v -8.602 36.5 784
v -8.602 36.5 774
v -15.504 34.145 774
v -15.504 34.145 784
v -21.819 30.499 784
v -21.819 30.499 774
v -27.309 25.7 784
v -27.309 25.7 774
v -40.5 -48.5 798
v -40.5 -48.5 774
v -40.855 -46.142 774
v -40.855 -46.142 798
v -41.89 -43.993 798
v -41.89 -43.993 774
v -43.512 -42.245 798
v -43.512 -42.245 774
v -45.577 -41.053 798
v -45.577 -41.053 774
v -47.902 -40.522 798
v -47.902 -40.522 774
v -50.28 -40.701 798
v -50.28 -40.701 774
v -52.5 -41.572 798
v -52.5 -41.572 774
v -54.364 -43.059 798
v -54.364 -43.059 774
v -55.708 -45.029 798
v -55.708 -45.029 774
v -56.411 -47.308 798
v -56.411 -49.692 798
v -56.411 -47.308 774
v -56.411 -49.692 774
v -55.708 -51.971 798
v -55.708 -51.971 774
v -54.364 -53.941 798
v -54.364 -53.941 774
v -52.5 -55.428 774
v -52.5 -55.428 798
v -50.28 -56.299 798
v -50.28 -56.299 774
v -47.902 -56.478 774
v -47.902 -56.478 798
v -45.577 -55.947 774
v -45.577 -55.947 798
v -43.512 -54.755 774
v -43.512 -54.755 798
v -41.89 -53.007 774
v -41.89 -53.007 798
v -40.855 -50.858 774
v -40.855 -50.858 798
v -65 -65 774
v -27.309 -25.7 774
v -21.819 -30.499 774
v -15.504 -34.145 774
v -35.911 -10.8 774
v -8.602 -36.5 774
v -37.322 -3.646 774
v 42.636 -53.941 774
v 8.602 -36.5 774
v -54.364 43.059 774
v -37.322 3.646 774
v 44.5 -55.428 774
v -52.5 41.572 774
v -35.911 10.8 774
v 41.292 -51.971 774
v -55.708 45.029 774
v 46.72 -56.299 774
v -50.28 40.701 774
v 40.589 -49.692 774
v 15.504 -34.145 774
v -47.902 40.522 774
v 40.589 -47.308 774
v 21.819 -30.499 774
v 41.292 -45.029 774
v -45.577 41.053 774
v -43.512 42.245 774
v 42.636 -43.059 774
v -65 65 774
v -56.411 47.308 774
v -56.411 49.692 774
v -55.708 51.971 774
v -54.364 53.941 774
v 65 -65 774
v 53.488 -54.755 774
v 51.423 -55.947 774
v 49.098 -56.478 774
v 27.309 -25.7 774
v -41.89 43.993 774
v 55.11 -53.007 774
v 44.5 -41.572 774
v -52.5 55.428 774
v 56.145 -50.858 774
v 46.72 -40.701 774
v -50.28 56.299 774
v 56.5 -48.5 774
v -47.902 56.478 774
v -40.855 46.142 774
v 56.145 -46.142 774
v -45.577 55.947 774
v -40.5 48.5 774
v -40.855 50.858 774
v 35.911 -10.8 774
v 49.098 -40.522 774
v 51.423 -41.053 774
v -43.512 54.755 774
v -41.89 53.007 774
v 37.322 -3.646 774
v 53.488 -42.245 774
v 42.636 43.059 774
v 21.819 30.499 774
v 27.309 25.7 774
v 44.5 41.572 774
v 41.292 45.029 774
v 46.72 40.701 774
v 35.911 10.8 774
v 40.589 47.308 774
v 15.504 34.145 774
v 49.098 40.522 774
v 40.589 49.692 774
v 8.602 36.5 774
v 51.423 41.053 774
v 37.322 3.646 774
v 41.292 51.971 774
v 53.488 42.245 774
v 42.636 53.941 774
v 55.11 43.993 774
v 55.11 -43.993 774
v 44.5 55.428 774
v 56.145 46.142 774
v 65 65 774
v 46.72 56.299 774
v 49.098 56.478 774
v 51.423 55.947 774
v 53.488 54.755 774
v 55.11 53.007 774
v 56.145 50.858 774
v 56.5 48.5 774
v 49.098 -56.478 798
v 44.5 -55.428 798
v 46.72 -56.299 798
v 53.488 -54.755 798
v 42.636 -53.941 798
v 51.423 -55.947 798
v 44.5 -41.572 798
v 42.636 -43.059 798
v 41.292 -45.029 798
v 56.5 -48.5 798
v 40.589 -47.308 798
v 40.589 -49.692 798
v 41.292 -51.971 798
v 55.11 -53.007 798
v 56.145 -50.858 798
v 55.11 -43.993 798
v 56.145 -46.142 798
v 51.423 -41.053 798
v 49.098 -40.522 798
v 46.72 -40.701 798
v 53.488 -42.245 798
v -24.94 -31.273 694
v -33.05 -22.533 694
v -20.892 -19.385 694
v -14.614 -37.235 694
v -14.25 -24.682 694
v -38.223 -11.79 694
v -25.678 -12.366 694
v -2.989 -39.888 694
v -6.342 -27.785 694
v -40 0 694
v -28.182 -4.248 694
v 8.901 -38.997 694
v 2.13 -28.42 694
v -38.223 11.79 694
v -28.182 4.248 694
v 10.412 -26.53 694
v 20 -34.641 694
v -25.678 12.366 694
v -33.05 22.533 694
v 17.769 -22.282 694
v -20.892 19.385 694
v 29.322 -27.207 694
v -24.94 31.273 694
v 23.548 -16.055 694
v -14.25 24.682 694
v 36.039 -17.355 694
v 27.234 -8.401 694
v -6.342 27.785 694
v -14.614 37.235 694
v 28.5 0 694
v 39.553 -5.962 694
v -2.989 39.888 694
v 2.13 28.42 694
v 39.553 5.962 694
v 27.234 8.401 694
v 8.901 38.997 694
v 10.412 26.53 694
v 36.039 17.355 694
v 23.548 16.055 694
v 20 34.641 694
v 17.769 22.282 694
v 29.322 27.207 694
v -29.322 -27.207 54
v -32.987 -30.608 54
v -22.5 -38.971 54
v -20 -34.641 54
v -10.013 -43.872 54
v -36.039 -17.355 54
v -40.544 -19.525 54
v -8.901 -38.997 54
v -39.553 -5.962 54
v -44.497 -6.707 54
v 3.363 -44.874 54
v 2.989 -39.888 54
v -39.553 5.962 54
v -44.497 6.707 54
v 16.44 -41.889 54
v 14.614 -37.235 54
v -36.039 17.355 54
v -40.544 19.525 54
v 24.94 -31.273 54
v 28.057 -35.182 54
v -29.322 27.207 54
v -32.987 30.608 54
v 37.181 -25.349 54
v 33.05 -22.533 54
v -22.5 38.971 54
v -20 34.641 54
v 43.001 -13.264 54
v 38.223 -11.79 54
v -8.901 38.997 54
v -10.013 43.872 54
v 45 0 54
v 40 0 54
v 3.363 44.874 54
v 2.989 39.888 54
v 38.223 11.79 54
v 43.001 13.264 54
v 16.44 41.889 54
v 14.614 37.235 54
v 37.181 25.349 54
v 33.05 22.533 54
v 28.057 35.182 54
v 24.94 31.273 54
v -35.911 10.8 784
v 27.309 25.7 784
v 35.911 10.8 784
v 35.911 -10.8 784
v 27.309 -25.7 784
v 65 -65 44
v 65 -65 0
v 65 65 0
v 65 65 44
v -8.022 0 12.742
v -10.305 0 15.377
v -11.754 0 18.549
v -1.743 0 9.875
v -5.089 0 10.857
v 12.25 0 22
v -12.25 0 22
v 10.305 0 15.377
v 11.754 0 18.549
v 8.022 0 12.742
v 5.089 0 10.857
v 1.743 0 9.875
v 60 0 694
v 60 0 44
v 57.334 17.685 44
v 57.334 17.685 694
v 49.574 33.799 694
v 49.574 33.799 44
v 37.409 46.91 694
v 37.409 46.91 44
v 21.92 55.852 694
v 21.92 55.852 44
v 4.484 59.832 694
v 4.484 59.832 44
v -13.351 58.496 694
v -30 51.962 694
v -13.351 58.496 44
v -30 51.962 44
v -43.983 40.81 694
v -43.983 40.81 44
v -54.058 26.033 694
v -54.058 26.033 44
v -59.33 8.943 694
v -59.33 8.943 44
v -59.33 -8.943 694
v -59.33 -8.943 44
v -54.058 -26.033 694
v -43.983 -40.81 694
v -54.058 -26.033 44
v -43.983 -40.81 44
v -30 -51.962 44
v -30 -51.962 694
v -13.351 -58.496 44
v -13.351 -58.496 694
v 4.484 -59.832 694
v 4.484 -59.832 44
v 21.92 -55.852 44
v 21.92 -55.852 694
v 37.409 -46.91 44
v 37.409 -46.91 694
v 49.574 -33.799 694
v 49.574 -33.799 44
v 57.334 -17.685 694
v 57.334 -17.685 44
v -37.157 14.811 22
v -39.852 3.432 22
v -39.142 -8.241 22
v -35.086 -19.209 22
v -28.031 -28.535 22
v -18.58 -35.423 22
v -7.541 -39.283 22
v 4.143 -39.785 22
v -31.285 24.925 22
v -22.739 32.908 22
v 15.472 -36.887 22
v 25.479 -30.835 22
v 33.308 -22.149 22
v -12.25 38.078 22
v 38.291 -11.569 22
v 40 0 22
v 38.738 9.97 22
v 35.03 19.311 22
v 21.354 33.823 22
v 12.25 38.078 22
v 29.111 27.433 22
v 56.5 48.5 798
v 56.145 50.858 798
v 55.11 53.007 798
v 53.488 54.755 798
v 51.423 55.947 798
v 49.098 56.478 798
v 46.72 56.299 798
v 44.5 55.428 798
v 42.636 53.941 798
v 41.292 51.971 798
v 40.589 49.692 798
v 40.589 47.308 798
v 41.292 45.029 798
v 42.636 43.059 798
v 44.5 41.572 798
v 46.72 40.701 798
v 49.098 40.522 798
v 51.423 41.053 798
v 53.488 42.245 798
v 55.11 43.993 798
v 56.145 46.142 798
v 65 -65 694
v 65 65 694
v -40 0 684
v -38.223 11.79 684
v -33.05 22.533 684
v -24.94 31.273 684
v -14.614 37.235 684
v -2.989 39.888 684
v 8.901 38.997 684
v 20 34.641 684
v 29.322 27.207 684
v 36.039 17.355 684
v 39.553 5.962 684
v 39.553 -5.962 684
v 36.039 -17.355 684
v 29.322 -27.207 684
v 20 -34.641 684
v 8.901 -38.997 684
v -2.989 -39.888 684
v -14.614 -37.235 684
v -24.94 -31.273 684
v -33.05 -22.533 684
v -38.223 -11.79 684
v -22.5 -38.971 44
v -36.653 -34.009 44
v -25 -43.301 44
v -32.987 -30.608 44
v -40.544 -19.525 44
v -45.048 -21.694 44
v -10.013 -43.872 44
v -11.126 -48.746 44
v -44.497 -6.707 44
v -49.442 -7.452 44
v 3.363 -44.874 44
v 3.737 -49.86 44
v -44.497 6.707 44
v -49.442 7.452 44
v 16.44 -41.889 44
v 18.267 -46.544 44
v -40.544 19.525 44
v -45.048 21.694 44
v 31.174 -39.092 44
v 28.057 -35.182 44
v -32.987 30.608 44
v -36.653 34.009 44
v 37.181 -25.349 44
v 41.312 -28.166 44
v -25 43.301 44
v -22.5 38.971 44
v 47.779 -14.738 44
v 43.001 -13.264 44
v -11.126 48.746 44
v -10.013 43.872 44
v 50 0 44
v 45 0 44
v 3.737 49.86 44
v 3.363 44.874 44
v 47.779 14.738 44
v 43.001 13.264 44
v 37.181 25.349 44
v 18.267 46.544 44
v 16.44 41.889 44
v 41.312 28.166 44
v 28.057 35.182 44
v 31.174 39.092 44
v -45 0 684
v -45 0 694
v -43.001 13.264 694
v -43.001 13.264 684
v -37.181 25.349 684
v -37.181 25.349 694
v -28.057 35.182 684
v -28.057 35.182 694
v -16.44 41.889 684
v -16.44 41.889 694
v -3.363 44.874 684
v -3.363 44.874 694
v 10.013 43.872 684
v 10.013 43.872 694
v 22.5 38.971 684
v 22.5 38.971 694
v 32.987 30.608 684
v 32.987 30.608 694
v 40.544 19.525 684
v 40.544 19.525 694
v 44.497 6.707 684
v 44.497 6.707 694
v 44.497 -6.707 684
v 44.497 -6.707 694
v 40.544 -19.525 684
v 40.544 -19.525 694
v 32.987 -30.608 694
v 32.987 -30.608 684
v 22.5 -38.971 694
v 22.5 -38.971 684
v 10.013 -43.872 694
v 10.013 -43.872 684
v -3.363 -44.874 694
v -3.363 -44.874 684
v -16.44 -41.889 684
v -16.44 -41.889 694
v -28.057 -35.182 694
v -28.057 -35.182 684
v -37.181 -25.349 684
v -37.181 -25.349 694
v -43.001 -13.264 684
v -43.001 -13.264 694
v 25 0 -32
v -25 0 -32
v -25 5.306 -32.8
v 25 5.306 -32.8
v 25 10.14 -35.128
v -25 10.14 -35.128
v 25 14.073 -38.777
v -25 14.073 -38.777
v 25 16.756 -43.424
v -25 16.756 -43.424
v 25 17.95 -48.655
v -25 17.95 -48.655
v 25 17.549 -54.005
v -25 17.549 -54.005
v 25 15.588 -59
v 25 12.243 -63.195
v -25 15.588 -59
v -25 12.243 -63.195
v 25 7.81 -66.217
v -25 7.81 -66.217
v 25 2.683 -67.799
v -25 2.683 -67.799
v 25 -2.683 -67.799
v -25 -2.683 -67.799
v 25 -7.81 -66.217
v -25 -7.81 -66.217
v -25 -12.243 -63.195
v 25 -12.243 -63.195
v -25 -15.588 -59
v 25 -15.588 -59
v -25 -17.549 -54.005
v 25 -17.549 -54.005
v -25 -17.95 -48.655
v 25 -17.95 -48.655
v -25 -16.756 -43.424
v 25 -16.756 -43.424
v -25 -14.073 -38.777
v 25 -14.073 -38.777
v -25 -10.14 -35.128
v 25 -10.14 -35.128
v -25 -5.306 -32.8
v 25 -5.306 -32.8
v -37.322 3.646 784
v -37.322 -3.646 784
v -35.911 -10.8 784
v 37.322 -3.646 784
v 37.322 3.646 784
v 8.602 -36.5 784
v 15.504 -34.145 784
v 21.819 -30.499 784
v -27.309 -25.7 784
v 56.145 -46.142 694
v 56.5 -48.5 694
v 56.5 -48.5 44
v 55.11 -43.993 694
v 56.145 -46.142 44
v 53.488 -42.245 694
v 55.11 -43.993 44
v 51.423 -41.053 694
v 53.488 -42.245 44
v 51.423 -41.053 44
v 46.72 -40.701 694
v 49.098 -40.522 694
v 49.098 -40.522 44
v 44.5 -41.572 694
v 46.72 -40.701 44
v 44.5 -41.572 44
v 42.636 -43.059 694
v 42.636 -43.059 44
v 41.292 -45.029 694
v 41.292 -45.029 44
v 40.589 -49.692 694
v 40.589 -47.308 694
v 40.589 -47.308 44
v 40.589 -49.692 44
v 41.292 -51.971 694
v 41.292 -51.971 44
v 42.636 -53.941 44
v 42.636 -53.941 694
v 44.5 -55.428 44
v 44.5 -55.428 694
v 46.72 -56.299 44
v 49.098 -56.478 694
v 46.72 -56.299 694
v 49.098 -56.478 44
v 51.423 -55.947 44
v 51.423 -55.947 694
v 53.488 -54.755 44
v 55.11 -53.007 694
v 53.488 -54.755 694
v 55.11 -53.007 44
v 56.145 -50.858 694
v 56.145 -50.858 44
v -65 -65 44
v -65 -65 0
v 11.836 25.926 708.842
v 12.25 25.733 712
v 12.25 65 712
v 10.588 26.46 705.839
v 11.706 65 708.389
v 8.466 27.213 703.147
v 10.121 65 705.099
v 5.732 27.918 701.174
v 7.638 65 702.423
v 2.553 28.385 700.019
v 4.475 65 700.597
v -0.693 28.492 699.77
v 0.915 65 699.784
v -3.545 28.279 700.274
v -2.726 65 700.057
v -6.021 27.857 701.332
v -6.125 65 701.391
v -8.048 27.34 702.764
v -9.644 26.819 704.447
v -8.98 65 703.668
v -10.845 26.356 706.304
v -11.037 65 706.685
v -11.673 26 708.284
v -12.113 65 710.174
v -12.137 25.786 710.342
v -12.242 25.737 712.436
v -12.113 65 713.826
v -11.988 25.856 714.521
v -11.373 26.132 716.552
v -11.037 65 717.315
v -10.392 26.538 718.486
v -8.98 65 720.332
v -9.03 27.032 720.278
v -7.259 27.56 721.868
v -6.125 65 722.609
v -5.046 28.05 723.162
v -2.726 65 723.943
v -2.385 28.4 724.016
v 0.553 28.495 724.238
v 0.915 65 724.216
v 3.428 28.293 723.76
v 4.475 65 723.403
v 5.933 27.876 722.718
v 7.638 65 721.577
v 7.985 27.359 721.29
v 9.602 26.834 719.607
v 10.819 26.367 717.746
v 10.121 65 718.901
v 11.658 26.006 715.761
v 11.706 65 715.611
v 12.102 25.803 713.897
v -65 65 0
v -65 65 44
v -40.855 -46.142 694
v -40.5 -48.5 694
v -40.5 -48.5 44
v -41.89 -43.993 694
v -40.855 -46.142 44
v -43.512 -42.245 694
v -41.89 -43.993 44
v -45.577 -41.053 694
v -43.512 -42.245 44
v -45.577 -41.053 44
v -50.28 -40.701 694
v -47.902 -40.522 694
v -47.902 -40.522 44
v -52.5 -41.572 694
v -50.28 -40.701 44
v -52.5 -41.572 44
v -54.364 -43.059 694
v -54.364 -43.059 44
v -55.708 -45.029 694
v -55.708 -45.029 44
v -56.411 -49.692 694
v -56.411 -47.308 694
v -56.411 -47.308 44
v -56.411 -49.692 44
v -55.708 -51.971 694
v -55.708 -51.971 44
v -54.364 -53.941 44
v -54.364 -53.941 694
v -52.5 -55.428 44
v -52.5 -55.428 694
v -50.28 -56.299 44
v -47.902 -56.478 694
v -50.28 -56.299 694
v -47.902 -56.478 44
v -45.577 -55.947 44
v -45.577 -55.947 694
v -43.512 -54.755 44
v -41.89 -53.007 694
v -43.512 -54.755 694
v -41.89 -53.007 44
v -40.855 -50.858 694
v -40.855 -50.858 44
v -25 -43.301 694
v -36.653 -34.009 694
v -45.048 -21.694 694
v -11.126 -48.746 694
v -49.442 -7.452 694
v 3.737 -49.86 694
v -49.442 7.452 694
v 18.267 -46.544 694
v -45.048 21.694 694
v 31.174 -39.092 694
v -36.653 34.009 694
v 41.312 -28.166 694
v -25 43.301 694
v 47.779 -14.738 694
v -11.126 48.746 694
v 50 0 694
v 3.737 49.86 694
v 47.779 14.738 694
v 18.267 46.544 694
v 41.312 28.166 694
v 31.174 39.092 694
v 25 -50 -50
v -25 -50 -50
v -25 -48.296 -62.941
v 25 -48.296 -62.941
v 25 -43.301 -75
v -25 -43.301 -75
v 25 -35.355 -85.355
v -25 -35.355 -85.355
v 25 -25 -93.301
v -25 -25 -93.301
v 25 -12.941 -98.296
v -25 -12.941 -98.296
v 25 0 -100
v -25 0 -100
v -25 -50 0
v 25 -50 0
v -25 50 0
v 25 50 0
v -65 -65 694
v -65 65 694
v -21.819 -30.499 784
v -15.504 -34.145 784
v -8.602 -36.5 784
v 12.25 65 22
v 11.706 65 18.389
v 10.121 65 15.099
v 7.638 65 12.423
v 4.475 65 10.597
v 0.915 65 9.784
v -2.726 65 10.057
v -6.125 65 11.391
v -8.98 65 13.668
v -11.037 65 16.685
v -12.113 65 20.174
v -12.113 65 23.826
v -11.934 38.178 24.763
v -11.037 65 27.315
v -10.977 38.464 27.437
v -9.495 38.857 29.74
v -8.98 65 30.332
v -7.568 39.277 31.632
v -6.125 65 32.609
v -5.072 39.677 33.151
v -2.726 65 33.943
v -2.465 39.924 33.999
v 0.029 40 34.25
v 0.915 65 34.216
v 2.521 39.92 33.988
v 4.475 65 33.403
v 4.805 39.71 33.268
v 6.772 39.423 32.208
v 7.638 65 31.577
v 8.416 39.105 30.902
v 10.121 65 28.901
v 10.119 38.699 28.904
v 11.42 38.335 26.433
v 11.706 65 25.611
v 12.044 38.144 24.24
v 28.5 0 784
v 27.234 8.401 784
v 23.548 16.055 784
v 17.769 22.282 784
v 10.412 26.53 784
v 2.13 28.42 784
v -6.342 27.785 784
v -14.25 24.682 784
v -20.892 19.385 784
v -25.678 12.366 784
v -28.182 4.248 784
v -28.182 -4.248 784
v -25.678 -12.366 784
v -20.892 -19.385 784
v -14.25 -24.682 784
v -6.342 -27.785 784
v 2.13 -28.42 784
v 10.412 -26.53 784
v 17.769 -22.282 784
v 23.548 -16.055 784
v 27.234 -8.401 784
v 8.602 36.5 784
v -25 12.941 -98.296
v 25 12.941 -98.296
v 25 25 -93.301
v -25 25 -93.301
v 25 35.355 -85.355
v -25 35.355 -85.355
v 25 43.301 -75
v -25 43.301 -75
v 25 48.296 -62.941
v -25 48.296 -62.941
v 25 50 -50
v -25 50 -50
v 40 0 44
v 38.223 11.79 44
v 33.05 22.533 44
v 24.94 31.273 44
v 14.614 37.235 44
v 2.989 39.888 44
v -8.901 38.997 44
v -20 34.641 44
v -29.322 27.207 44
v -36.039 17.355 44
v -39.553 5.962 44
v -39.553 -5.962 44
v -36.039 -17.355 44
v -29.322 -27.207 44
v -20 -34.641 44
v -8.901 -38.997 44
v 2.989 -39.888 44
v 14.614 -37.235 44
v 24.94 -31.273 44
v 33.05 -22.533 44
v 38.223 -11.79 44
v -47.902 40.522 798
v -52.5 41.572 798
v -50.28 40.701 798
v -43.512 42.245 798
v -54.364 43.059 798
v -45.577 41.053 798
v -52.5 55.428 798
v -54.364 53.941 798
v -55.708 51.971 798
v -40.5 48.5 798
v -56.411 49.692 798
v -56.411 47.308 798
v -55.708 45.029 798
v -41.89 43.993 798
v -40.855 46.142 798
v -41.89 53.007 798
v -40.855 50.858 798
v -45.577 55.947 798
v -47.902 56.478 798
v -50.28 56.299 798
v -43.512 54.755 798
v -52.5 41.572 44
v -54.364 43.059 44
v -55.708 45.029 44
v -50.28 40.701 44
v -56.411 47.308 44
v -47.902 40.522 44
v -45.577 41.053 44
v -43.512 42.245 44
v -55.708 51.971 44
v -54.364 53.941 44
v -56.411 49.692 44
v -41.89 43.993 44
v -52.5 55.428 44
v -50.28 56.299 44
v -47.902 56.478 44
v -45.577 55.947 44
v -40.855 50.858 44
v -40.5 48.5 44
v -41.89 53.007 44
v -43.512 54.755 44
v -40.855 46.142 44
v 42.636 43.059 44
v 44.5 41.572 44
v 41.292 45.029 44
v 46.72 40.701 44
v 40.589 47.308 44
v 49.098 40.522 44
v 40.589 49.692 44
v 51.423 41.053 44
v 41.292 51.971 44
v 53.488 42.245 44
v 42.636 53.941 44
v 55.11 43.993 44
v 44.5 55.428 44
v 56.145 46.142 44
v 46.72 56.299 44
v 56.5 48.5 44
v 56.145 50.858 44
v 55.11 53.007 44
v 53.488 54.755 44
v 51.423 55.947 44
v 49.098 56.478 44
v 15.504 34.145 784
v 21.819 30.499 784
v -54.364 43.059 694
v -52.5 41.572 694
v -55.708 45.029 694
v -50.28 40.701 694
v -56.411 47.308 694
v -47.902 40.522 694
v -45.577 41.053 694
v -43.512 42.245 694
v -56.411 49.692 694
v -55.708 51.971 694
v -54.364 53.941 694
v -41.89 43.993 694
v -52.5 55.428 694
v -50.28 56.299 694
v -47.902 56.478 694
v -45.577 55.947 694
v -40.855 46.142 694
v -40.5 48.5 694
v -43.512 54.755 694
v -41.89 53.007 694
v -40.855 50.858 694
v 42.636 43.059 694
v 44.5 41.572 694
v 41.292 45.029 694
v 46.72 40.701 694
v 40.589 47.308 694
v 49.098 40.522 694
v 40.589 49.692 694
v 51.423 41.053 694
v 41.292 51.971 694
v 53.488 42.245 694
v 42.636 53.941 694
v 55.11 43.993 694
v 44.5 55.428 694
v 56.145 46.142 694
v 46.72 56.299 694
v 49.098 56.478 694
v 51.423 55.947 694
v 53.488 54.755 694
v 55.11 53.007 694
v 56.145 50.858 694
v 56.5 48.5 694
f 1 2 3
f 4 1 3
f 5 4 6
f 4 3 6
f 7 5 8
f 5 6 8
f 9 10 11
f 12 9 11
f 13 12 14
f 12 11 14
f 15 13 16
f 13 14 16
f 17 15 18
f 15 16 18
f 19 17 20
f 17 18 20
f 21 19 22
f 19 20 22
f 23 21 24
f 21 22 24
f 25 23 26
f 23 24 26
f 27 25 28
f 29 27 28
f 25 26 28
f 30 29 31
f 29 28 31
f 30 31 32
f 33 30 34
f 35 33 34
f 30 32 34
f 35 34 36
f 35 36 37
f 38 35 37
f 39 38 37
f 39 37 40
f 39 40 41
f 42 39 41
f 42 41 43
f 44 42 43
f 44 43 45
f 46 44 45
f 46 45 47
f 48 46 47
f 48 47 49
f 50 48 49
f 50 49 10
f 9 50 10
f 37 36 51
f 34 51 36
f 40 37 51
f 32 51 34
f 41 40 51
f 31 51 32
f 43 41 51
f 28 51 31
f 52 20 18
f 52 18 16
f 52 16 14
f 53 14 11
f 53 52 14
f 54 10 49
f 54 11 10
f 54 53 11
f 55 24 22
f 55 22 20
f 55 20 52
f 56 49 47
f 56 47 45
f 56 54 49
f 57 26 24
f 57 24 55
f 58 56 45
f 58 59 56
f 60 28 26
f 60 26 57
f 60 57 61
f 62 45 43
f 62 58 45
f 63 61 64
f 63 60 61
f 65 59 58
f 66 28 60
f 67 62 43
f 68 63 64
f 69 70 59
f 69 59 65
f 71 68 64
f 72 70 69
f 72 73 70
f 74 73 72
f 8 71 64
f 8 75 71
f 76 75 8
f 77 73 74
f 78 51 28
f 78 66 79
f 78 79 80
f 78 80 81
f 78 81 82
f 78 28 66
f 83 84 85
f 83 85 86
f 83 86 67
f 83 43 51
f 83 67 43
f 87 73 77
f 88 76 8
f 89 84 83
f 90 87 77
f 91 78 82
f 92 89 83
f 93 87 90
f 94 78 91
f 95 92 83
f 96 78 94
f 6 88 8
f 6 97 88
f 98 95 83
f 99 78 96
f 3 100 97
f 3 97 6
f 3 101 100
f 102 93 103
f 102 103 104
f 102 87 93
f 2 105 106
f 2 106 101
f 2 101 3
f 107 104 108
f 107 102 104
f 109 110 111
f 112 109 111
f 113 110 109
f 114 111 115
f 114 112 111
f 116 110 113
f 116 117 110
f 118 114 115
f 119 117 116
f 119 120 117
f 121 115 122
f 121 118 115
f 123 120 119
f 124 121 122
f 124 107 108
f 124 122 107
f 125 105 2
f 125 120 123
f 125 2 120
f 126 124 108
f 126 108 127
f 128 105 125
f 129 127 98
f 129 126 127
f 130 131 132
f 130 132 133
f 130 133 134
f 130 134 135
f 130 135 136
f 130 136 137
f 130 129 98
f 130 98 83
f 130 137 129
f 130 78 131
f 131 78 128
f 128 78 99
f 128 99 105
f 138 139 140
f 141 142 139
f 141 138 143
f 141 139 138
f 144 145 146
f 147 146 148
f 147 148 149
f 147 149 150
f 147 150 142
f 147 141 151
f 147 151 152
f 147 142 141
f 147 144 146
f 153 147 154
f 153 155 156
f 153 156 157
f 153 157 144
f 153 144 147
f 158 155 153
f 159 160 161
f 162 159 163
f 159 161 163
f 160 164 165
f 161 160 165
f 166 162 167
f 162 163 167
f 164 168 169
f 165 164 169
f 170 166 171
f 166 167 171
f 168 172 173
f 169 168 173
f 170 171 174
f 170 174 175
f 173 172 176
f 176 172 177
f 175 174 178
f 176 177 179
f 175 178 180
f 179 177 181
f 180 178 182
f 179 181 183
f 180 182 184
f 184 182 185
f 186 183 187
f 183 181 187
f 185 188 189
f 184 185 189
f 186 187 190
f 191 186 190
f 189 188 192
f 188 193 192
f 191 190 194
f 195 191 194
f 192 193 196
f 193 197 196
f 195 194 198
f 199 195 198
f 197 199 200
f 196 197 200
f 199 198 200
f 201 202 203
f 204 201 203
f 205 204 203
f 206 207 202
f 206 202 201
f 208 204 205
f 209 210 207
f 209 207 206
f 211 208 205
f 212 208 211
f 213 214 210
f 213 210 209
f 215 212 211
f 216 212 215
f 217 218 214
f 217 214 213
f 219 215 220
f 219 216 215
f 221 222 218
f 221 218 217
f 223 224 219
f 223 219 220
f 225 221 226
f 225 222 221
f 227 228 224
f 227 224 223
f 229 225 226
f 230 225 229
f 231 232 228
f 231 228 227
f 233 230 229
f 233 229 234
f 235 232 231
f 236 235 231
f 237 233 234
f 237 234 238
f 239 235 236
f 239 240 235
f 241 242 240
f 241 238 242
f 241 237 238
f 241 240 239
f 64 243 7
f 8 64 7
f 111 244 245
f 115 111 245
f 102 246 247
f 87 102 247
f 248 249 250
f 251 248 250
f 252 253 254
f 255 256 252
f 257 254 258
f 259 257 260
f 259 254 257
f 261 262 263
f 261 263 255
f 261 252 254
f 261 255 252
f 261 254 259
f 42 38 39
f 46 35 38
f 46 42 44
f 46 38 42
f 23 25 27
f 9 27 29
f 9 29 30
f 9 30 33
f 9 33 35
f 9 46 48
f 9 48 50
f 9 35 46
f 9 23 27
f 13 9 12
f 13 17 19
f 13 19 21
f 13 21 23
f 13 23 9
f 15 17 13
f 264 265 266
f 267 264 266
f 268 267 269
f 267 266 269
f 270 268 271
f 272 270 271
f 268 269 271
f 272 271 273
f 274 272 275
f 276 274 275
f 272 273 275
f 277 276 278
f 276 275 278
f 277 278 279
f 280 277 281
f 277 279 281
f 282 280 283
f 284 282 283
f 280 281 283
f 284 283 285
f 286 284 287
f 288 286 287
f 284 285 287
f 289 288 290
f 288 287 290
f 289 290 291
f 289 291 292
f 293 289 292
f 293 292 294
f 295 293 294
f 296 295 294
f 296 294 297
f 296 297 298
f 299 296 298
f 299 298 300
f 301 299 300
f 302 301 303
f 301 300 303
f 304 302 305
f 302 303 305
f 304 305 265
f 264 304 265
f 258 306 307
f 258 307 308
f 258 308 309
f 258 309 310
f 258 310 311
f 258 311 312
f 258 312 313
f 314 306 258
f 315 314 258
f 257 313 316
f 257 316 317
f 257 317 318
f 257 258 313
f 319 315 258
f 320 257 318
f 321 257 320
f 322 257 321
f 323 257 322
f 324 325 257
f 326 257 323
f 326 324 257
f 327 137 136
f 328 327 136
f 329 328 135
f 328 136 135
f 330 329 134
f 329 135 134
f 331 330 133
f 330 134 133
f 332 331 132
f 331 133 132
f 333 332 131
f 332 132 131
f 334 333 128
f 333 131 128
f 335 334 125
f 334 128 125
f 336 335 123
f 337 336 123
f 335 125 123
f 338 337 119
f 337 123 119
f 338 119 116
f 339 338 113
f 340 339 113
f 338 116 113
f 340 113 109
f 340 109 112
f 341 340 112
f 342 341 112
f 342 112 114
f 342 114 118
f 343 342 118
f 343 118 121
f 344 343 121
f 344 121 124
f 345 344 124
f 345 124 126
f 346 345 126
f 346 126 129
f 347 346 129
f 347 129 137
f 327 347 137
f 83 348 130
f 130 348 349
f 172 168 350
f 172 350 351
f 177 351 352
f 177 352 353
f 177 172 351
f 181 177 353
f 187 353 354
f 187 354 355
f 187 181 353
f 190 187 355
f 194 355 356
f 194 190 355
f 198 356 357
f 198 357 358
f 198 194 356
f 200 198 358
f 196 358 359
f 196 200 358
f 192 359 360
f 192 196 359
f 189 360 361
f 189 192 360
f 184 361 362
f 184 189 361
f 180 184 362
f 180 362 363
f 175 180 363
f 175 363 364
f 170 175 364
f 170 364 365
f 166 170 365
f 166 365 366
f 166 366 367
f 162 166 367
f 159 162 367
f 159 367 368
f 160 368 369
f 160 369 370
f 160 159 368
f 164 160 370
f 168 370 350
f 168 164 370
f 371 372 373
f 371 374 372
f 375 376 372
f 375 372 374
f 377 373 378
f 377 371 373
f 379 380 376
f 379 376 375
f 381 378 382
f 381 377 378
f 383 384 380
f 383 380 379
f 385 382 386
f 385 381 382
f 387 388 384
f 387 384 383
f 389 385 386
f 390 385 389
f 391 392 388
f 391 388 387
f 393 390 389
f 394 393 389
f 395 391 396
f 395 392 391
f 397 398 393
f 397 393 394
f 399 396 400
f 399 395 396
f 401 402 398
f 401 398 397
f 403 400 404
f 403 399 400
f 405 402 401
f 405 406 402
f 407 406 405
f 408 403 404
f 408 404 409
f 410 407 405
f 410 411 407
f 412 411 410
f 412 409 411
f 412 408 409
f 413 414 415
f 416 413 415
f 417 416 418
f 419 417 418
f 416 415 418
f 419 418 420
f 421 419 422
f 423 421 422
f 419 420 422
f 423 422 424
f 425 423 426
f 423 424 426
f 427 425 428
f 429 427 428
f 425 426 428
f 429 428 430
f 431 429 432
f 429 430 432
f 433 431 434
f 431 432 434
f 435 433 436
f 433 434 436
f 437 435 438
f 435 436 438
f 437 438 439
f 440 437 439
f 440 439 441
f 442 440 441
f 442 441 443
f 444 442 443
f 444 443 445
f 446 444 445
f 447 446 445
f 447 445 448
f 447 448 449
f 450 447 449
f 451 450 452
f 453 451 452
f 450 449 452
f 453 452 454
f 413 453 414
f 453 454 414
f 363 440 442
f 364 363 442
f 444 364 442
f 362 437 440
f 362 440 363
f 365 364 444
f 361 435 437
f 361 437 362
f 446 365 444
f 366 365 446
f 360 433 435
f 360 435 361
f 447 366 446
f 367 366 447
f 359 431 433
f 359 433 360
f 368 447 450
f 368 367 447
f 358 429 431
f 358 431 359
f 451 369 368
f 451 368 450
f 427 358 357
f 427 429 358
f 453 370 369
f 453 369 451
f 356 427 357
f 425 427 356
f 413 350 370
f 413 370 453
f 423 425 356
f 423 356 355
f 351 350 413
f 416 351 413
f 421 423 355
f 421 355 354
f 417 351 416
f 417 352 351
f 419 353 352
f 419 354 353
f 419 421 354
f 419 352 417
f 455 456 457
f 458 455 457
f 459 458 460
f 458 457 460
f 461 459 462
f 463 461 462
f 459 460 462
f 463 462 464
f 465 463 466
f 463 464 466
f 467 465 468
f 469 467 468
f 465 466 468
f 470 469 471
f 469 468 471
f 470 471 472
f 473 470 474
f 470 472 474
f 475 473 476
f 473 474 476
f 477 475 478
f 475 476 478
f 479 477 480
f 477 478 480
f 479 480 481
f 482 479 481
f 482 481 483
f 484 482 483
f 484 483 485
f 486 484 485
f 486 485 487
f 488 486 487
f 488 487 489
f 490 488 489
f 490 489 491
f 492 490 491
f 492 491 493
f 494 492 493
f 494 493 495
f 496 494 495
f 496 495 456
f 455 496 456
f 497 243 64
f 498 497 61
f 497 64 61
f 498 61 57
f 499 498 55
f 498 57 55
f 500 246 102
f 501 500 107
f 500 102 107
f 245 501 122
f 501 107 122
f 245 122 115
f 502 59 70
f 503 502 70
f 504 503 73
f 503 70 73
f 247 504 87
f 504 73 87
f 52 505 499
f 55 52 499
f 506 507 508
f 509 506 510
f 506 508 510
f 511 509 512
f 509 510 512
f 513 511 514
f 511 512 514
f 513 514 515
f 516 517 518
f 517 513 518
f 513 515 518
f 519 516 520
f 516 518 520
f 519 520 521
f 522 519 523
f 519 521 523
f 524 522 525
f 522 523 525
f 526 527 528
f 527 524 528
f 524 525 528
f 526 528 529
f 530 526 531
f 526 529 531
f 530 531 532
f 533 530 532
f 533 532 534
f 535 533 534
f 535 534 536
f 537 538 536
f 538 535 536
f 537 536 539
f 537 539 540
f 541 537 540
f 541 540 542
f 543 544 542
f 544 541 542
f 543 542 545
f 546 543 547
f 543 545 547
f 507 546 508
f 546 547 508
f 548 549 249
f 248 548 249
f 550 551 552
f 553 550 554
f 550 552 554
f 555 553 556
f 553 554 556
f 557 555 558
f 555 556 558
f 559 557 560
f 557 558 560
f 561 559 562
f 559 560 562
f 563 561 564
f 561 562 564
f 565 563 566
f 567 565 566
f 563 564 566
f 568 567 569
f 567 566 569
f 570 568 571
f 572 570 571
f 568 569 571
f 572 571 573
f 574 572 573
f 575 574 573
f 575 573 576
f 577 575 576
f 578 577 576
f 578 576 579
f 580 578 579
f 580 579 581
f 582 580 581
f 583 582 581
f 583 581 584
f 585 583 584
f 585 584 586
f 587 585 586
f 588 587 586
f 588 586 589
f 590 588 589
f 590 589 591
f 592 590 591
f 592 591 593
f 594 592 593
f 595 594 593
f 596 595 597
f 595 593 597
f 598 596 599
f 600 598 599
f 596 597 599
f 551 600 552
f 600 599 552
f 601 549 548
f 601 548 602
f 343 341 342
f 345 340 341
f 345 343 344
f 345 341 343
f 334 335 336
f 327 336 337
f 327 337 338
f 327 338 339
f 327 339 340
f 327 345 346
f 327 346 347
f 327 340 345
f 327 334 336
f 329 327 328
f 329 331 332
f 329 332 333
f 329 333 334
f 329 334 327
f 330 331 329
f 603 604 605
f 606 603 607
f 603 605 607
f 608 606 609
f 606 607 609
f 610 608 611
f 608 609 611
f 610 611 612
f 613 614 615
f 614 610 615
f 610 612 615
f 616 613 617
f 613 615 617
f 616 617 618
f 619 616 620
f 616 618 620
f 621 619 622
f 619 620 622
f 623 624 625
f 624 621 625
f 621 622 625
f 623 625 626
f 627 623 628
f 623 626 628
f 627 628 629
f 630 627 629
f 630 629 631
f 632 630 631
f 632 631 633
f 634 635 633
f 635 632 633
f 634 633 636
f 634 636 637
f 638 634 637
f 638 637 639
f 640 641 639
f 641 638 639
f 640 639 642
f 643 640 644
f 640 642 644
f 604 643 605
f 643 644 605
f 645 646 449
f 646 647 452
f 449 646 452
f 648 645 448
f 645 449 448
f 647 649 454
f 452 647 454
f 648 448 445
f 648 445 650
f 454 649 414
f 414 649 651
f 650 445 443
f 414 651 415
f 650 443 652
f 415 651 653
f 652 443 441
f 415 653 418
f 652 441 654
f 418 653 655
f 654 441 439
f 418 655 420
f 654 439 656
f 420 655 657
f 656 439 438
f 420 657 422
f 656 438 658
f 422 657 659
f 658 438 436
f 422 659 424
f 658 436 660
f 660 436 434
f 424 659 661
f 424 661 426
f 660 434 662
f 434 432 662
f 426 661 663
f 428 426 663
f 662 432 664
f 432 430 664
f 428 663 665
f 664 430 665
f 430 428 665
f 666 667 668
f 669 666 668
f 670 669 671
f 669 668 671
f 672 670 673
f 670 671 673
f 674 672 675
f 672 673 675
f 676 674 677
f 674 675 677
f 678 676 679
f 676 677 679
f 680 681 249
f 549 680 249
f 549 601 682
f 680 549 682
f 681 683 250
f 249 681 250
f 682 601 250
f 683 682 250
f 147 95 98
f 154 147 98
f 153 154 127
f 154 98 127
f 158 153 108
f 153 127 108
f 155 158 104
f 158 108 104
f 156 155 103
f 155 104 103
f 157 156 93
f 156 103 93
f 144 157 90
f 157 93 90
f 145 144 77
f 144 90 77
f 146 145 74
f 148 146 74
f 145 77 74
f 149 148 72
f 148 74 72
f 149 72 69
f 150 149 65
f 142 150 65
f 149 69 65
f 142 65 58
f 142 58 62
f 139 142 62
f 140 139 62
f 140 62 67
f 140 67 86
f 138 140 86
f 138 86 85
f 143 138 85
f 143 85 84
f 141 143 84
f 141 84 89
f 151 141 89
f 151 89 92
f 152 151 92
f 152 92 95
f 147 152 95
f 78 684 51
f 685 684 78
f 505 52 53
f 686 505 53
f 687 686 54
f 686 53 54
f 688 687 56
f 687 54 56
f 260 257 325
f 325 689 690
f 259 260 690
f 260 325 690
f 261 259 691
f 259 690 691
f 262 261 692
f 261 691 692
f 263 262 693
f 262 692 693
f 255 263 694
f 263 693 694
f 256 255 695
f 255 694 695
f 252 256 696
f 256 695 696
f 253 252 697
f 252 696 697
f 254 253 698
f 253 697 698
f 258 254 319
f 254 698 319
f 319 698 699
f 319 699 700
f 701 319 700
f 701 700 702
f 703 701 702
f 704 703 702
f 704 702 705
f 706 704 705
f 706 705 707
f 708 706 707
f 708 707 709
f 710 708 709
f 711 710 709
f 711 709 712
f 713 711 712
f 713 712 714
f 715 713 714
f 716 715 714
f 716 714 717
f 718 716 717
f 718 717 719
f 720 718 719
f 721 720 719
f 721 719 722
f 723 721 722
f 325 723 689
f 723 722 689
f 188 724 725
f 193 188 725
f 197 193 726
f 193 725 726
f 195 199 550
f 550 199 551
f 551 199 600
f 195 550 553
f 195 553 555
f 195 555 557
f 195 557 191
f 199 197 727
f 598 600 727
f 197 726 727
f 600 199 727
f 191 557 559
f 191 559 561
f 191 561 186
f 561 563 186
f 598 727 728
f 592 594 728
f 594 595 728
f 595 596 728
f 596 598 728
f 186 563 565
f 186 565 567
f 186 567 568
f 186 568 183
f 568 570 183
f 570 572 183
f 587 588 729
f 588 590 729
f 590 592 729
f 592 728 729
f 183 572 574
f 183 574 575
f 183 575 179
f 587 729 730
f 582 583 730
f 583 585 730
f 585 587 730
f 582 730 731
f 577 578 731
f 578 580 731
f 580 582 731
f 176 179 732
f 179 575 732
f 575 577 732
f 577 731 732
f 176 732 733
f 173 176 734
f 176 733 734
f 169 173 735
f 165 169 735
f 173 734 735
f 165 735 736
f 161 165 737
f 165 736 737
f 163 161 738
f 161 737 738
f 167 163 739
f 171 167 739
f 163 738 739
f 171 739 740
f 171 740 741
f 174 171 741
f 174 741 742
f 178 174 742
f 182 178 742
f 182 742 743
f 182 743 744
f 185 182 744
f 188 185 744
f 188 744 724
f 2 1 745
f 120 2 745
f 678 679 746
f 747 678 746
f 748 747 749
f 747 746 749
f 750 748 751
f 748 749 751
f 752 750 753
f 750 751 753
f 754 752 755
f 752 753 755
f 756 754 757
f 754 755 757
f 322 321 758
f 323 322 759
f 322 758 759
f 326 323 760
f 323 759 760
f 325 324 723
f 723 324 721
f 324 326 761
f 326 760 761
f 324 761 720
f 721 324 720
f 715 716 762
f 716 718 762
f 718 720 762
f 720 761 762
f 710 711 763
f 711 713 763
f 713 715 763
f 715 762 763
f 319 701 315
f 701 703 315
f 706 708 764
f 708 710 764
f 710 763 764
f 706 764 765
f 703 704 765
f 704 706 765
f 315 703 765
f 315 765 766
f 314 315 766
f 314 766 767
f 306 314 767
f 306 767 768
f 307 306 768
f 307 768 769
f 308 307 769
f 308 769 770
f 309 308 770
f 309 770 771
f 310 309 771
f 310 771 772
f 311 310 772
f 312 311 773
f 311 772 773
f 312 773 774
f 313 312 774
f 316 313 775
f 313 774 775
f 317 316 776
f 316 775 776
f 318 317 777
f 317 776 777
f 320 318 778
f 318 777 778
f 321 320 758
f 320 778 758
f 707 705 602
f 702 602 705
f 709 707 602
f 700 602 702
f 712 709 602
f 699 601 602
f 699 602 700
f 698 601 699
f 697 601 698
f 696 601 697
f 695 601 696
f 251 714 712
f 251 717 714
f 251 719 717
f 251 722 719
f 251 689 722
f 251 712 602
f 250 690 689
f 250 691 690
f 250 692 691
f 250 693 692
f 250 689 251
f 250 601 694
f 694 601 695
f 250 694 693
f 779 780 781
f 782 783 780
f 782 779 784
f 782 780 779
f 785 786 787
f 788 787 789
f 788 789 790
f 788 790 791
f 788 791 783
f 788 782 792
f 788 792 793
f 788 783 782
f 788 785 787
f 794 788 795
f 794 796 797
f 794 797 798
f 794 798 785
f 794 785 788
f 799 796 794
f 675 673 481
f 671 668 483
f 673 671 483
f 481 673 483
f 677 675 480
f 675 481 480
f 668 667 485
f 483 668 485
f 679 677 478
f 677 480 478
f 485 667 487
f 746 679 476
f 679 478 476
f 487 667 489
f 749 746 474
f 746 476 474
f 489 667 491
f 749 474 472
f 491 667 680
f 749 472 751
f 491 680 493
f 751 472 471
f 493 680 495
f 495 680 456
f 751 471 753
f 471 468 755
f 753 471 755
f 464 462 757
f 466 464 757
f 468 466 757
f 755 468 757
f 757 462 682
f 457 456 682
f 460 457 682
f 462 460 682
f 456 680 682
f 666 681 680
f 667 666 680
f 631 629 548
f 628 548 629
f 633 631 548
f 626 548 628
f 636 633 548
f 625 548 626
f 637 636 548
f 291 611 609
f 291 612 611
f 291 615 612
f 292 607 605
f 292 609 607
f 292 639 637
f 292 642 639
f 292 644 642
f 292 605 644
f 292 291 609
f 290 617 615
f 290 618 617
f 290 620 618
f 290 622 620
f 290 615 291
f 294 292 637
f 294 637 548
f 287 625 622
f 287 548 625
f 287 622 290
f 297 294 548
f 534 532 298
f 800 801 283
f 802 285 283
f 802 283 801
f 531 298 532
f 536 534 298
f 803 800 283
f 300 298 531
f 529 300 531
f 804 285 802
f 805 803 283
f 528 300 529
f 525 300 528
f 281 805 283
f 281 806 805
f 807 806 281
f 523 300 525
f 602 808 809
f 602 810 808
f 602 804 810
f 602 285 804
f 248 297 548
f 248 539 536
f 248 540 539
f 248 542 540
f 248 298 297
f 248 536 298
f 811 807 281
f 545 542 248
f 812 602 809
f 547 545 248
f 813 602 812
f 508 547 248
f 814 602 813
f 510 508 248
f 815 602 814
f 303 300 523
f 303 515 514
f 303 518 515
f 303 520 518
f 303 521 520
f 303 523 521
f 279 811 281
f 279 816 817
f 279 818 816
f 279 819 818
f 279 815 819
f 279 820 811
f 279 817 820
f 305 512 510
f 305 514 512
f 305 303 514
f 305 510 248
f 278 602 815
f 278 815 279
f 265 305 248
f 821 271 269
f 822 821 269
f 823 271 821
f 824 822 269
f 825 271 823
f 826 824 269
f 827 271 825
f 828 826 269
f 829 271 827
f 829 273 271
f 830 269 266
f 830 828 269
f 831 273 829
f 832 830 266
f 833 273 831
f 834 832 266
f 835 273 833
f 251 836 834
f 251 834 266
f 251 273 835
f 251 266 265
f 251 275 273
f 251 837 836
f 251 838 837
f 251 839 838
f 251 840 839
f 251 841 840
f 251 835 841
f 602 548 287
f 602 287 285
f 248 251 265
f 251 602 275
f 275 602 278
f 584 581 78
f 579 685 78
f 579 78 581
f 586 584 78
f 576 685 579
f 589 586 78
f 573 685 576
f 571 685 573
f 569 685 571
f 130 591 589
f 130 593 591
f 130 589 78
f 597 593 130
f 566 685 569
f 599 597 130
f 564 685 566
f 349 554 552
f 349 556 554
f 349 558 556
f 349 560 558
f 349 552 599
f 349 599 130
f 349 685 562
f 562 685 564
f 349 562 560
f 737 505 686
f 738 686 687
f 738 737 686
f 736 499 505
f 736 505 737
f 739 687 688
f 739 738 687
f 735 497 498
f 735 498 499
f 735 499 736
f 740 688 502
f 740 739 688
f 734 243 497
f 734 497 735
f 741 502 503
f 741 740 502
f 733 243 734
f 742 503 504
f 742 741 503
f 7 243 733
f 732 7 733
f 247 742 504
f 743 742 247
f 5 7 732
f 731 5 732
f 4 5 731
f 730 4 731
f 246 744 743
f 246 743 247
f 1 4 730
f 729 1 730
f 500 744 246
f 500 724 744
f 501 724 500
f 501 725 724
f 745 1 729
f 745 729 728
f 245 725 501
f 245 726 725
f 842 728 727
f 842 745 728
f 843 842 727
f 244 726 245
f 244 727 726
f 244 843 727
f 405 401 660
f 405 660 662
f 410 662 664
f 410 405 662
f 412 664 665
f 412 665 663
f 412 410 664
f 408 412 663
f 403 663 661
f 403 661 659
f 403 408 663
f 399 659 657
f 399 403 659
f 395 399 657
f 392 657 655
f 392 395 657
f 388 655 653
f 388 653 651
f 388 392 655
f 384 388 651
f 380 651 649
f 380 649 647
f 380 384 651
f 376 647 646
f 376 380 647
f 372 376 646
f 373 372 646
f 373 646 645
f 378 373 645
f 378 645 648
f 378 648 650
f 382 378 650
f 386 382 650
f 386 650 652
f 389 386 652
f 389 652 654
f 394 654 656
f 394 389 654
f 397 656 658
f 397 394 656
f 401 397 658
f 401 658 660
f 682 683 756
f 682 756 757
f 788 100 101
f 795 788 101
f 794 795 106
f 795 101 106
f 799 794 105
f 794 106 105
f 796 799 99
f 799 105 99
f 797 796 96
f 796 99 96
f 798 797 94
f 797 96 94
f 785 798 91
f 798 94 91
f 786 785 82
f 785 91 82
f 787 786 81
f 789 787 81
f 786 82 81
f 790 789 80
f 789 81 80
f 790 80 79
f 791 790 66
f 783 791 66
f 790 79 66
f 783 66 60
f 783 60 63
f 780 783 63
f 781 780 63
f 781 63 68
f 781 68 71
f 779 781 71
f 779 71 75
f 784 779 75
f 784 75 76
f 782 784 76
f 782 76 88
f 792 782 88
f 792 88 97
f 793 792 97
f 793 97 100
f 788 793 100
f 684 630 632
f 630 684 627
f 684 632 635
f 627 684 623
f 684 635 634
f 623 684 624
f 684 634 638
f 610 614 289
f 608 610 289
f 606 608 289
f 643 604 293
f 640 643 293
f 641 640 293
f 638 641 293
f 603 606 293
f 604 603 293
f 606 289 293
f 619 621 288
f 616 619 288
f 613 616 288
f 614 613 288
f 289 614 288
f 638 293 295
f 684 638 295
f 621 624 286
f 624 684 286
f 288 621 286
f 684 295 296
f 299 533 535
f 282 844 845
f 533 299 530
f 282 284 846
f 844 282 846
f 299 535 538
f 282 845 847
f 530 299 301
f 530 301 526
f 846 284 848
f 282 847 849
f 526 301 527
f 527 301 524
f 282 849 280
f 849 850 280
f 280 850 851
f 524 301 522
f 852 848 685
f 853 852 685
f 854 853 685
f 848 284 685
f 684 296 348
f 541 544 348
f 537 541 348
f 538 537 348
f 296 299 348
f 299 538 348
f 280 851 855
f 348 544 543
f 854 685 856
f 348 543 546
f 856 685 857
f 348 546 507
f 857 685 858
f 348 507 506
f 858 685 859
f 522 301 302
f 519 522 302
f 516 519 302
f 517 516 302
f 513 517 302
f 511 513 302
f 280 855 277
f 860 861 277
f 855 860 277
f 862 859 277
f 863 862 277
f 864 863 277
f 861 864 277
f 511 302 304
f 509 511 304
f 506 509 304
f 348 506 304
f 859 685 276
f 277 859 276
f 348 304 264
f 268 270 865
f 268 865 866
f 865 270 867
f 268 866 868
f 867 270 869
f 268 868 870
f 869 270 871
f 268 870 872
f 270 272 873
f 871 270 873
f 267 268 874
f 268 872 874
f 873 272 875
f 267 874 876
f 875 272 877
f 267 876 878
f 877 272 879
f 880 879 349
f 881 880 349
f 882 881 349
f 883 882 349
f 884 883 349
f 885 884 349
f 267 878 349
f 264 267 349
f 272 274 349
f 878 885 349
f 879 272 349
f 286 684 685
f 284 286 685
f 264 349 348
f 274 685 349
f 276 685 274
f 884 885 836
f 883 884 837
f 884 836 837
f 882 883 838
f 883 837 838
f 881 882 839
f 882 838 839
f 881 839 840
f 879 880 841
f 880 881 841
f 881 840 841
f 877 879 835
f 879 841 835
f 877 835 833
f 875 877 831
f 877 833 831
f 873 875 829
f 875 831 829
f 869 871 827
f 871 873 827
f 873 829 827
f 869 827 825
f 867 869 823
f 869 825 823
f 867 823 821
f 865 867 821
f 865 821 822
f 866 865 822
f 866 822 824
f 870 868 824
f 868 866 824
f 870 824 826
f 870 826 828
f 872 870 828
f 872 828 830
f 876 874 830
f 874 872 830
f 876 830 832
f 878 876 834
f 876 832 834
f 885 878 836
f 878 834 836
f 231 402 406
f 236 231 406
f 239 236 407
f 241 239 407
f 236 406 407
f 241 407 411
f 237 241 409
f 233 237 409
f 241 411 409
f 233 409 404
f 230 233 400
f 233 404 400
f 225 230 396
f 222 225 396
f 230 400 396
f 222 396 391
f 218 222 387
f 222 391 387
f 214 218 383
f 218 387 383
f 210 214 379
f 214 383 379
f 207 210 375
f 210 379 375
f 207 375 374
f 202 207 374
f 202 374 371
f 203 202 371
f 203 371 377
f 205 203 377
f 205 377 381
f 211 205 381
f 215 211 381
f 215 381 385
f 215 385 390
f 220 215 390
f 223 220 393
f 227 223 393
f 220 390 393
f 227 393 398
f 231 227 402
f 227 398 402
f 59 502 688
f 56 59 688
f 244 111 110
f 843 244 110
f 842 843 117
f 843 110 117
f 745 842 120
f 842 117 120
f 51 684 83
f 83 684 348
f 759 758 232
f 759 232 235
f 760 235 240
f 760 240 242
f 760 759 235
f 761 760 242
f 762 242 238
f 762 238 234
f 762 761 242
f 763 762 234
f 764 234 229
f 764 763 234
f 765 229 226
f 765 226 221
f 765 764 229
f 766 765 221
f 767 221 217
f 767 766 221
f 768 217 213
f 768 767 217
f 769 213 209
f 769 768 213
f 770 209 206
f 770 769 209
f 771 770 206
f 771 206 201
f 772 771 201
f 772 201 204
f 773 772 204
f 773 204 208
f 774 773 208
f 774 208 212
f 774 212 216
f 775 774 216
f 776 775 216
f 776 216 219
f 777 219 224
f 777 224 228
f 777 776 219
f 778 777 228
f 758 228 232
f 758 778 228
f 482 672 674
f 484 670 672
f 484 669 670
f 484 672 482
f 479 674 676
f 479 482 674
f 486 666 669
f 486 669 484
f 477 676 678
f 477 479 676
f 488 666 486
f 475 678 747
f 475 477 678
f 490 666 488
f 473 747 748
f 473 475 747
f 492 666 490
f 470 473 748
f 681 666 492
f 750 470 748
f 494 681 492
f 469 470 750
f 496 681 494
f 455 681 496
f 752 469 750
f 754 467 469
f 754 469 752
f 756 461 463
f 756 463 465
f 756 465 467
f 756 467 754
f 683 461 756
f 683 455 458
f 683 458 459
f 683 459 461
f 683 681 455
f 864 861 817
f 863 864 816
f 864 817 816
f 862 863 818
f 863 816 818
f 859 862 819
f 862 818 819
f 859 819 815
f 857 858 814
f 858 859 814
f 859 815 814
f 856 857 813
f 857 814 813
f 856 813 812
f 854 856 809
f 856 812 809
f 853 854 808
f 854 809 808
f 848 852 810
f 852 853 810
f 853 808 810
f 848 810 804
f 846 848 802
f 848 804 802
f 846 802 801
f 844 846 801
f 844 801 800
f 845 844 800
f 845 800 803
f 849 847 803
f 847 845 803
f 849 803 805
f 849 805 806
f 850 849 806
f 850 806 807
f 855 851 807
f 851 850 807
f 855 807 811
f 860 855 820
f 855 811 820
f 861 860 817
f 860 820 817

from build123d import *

# Parameters (mm, degrees)
ESBO_O1_W                = 130
ESBO_O1_H                = 130
RESSALTO_EXTRUS_O1_DEPTH = 44
ESBO_O13_R               = 45
ESBO_O13_R_2             = 40
RESSALTO_EXTRUS_O7_DEPTH = 10
ESBO_O2_R                = 60
ESBO_O2_R_2              = 50
RESSALTO_EXTRUS_O2_DEPTH = 650
ESBO_O3_W                = 130
ESBO_O3_H                = 130
RESSALTO_EXTRUS_O3_DEPTH = 80
ESBO_O4_R                = 8
RESSALTO_EXTRUS_O4_DEPTH = 754
ESBO_O5_R                = 37.5
RESSALTO_EXTRUS_O5_DEPTH = 10
CORTE_EXTRUS_O1_DEPTH    = 10
ESBO_O7_R                = 28.5
CORTE_EXTRUS_O2_DEPTH    = 280
ESBO_O8_W                = 50
ESBO_O8_H                = 100
RESSALTO_EXTRUS_O6_DEPTH = 100
ESBO_O9_R                = 18
CORTE_EXTRUS_O3_DEPTH    = 91
ESBO_O10_R               = 12.25
CORTE_EXTRUS_O4_DEPTH    = 65
ESBO_O11_R               = 12.25
CORTE_EXTRUS_O5_DEPTH    = 65
ESBO_O12_R               = 40
CORTE_EXTRUS_O6_DEPTH    = 22
ESBO_O14_R               = 45
ESBO_O14_R_2             = 40
RESSALTO_EXTRUS_O8_DEPTH = 10


with BuildPart() as part:
    # Esboço1 → Ressalto-extrusão1 (new body)
    with BuildSketch(Plane.XY):
        Rectangle(ESBO_O1_W, ESBO_O1_H)
    extrude(amount=RESSALTO_EXTRUS_O1_DEPTH)

    # Esboço13 → Ressalto-extrusão7 (add)
    with BuildSketch(Plane.XY.offset(44)):
        Circle(ESBO_O13_R)
        Circle(ESBO_O13_R_2, mode=Mode.SUBTRACT)
    extrude(amount=RESSALTO_EXTRUS_O7_DEPTH)

    # Esboço2 → Ressalto-extrusão2 (add)
    with BuildSketch(Plane.XY.offset(44)):
        Circle(ESBO_O2_R)
        Circle(ESBO_O2_R_2, mode=Mode.SUBTRACT)
    extrude(amount=RESSALTO_EXTRUS_O2_DEPTH)

    # Esboço3 → Ressalto-extrusão3 (add)
    with BuildSketch(Plane.XY.offset(694)):
        Rectangle(ESBO_O3_W, ESBO_O3_H)
    extrude(amount=RESSALTO_EXTRUS_O3_DEPTH)

    # Esboço4 → Ressalto-extrusão4 (add)
    with BuildSketch(Plane.XY.offset(44)):
        with Locations((-48.5, 48.5)):
            Circle(ESBO_O4_R)
        with Locations((-48.5, -48.5)):
            Circle(ESBO_O4_R)
        with Locations((48.5, -48.5)):
            Circle(ESBO_O4_R)
        with Locations((48.5, 48.5)):
            Circle(ESBO_O4_R)
    extrude(amount=RESSALTO_EXTRUS_O4_DEPTH)

    # Esboço5 → Ressalto-extrusão5 (add)
    with BuildSketch(Plane.XY.offset(774)):
        Circle(ESBO_O5_R)
    extrude(amount=RESSALTO_EXTRUS_O5_DEPTH)

    # Esboço6 → Corte-extrusão1 (cut)
    with BuildSketch(Plane.XY.offset(784)):
        with BuildLine():
            Line((-35.911089872, 10.800167787), (-27.308764605, 25.699832213))
            ThreePointArc((-27.308764605, 25.699832213), (-32.475952642, 18.75), (-35.911089872, 10.800167787))
        make_face()
        with BuildLine():
            Line((-8.602325267, 36.5), (8.602325267, 36.5))
            ThreePointArc((8.602325267, 36.5), (0, 37.5), (-8.602325267, 36.5))
        make_face()
        with BuildLine():
            Line((27.308764605, 25.699832213), (35.911089872, 10.800167787))
            ThreePointArc((35.911089872, 10.800167787), (32.475952642, 18.75), (27.308764605, 25.699832213))
        make_face()
        with BuildLine():
            ThreePointArc((-35.911089872, -10.800167787), (-32.475952642, -18.75), (-27.308764605, -25.699832213))
            Line((-27.308764605, -25.699832213), (-35.911089872, -10.800167787))
        make_face()
        with BuildLine():
            ThreePointArc((-8.602325267, -36.5), (0, -37.5), (8.602325267, -36.5))
            Line((8.602325267, -36.5), (-8.602325267, -36.5))
        make_face()
        with BuildLine():
            ThreePointArc((27.308764605, -25.699832213), (32.475952642, -18.75), (35.911089872, -10.800167787))
            Line((35.911089872, -10.800167787), (27.308764605, -25.699832213))
        make_face()
    extrude(amount=-CORTE_EXTRUS_O1_DEPTH, mode=Mode.SUBTRACT)

    # Esboço7 → Corte-extrusão2 (cut)
    with BuildSketch(Plane.XY.offset(784)):
        Circle(ESBO_O7_R)
    extrude(amount=-CORTE_EXTRUS_O2_DEPTH, mode=Mode.SUBTRACT)

    # Esboço8 → Ressalto-extrusão6 (add)
    with BuildSketch(Plane(origin=(0, 0, 0), x_dir=(-1, 0, 0), z_dir=(0, 0, -1))):
        Rectangle(ESBO_O8_W, ESBO_O8_H)
    extrude(amount=RESSALTO_EXTRUS_O6_DEPTH)

    # Esboço9 → Corte-extrusão3 (cut, through all)
    with BuildSketch(Plane.ZY.offset(25)):
        with BuildLine():
            Line((-100, 50), (-100, 2.01e-07))
            ThreePointArc((-100, 2.01e-07), (-85.355338988, 35.355339131), (-50, 50))
            Line((-50, 50), (-100, 50))
        make_face()
        with BuildLine():
            Line((-100, -50), (-50, -50))
            ThreePointArc((-50, -50), (-85.355339131, -35.355338988), (-100, 2.01e-07))
            Line((-100, 2.01e-07), (-100, -50))
        make_face()
        with Locations((-50, 0)):
            Circle(ESBO_O9_R)
    extrude(amount=-CORTE_EXTRUS_O3_DEPTH, mode=Mode.SUBTRACT)

    # Esboço10 → Corte-extrusão4 (cut)
    with BuildSketch(Plane(origin=(0, 65, 0), x_dir=(1, 0, 0), z_dir=(0, 1, 0))):
        with Locations((0, -22)):
            Circle(ESBO_O10_R)
    extrude(amount=-CORTE_EXTRUS_O4_DEPTH, mode=Mode.SUBTRACT)

    # Esboço11 → Corte-extrusão5 (cut)
    with BuildSketch(Plane(origin=(0, 65, 0), x_dir=(1, 0, 0), z_dir=(0, 1, 0))):
        with Locations((0, -712)):
            Circle(ESBO_O11_R)
    extrude(amount=-CORTE_EXTRUS_O5_DEPTH, mode=Mode.SUBTRACT)

    # Esboço12 → Corte-extrusão6 (cut)
    with BuildSketch(Plane.XY.offset(44)):
        Circle(ESBO_O12_R)
    extrude(amount=-CORTE_EXTRUS_O6_DEPTH, mode=Mode.SUBTRACT)

    # Esboço14 → Ressalto-extrusão8 (add)
    with BuildSketch(Plane(origin=(0, 0, 694), x_dir=(-1, 0, 0), z_dir=(0, 0, -1))):
        Circle(ESBO_O14_R)
        Circle(ESBO_O14_R_2, mode=Mode.SUBTRACT)
    extrude(amount=RESSALTO_EXTRUS_O8_DEPTH)


solid = part.part
